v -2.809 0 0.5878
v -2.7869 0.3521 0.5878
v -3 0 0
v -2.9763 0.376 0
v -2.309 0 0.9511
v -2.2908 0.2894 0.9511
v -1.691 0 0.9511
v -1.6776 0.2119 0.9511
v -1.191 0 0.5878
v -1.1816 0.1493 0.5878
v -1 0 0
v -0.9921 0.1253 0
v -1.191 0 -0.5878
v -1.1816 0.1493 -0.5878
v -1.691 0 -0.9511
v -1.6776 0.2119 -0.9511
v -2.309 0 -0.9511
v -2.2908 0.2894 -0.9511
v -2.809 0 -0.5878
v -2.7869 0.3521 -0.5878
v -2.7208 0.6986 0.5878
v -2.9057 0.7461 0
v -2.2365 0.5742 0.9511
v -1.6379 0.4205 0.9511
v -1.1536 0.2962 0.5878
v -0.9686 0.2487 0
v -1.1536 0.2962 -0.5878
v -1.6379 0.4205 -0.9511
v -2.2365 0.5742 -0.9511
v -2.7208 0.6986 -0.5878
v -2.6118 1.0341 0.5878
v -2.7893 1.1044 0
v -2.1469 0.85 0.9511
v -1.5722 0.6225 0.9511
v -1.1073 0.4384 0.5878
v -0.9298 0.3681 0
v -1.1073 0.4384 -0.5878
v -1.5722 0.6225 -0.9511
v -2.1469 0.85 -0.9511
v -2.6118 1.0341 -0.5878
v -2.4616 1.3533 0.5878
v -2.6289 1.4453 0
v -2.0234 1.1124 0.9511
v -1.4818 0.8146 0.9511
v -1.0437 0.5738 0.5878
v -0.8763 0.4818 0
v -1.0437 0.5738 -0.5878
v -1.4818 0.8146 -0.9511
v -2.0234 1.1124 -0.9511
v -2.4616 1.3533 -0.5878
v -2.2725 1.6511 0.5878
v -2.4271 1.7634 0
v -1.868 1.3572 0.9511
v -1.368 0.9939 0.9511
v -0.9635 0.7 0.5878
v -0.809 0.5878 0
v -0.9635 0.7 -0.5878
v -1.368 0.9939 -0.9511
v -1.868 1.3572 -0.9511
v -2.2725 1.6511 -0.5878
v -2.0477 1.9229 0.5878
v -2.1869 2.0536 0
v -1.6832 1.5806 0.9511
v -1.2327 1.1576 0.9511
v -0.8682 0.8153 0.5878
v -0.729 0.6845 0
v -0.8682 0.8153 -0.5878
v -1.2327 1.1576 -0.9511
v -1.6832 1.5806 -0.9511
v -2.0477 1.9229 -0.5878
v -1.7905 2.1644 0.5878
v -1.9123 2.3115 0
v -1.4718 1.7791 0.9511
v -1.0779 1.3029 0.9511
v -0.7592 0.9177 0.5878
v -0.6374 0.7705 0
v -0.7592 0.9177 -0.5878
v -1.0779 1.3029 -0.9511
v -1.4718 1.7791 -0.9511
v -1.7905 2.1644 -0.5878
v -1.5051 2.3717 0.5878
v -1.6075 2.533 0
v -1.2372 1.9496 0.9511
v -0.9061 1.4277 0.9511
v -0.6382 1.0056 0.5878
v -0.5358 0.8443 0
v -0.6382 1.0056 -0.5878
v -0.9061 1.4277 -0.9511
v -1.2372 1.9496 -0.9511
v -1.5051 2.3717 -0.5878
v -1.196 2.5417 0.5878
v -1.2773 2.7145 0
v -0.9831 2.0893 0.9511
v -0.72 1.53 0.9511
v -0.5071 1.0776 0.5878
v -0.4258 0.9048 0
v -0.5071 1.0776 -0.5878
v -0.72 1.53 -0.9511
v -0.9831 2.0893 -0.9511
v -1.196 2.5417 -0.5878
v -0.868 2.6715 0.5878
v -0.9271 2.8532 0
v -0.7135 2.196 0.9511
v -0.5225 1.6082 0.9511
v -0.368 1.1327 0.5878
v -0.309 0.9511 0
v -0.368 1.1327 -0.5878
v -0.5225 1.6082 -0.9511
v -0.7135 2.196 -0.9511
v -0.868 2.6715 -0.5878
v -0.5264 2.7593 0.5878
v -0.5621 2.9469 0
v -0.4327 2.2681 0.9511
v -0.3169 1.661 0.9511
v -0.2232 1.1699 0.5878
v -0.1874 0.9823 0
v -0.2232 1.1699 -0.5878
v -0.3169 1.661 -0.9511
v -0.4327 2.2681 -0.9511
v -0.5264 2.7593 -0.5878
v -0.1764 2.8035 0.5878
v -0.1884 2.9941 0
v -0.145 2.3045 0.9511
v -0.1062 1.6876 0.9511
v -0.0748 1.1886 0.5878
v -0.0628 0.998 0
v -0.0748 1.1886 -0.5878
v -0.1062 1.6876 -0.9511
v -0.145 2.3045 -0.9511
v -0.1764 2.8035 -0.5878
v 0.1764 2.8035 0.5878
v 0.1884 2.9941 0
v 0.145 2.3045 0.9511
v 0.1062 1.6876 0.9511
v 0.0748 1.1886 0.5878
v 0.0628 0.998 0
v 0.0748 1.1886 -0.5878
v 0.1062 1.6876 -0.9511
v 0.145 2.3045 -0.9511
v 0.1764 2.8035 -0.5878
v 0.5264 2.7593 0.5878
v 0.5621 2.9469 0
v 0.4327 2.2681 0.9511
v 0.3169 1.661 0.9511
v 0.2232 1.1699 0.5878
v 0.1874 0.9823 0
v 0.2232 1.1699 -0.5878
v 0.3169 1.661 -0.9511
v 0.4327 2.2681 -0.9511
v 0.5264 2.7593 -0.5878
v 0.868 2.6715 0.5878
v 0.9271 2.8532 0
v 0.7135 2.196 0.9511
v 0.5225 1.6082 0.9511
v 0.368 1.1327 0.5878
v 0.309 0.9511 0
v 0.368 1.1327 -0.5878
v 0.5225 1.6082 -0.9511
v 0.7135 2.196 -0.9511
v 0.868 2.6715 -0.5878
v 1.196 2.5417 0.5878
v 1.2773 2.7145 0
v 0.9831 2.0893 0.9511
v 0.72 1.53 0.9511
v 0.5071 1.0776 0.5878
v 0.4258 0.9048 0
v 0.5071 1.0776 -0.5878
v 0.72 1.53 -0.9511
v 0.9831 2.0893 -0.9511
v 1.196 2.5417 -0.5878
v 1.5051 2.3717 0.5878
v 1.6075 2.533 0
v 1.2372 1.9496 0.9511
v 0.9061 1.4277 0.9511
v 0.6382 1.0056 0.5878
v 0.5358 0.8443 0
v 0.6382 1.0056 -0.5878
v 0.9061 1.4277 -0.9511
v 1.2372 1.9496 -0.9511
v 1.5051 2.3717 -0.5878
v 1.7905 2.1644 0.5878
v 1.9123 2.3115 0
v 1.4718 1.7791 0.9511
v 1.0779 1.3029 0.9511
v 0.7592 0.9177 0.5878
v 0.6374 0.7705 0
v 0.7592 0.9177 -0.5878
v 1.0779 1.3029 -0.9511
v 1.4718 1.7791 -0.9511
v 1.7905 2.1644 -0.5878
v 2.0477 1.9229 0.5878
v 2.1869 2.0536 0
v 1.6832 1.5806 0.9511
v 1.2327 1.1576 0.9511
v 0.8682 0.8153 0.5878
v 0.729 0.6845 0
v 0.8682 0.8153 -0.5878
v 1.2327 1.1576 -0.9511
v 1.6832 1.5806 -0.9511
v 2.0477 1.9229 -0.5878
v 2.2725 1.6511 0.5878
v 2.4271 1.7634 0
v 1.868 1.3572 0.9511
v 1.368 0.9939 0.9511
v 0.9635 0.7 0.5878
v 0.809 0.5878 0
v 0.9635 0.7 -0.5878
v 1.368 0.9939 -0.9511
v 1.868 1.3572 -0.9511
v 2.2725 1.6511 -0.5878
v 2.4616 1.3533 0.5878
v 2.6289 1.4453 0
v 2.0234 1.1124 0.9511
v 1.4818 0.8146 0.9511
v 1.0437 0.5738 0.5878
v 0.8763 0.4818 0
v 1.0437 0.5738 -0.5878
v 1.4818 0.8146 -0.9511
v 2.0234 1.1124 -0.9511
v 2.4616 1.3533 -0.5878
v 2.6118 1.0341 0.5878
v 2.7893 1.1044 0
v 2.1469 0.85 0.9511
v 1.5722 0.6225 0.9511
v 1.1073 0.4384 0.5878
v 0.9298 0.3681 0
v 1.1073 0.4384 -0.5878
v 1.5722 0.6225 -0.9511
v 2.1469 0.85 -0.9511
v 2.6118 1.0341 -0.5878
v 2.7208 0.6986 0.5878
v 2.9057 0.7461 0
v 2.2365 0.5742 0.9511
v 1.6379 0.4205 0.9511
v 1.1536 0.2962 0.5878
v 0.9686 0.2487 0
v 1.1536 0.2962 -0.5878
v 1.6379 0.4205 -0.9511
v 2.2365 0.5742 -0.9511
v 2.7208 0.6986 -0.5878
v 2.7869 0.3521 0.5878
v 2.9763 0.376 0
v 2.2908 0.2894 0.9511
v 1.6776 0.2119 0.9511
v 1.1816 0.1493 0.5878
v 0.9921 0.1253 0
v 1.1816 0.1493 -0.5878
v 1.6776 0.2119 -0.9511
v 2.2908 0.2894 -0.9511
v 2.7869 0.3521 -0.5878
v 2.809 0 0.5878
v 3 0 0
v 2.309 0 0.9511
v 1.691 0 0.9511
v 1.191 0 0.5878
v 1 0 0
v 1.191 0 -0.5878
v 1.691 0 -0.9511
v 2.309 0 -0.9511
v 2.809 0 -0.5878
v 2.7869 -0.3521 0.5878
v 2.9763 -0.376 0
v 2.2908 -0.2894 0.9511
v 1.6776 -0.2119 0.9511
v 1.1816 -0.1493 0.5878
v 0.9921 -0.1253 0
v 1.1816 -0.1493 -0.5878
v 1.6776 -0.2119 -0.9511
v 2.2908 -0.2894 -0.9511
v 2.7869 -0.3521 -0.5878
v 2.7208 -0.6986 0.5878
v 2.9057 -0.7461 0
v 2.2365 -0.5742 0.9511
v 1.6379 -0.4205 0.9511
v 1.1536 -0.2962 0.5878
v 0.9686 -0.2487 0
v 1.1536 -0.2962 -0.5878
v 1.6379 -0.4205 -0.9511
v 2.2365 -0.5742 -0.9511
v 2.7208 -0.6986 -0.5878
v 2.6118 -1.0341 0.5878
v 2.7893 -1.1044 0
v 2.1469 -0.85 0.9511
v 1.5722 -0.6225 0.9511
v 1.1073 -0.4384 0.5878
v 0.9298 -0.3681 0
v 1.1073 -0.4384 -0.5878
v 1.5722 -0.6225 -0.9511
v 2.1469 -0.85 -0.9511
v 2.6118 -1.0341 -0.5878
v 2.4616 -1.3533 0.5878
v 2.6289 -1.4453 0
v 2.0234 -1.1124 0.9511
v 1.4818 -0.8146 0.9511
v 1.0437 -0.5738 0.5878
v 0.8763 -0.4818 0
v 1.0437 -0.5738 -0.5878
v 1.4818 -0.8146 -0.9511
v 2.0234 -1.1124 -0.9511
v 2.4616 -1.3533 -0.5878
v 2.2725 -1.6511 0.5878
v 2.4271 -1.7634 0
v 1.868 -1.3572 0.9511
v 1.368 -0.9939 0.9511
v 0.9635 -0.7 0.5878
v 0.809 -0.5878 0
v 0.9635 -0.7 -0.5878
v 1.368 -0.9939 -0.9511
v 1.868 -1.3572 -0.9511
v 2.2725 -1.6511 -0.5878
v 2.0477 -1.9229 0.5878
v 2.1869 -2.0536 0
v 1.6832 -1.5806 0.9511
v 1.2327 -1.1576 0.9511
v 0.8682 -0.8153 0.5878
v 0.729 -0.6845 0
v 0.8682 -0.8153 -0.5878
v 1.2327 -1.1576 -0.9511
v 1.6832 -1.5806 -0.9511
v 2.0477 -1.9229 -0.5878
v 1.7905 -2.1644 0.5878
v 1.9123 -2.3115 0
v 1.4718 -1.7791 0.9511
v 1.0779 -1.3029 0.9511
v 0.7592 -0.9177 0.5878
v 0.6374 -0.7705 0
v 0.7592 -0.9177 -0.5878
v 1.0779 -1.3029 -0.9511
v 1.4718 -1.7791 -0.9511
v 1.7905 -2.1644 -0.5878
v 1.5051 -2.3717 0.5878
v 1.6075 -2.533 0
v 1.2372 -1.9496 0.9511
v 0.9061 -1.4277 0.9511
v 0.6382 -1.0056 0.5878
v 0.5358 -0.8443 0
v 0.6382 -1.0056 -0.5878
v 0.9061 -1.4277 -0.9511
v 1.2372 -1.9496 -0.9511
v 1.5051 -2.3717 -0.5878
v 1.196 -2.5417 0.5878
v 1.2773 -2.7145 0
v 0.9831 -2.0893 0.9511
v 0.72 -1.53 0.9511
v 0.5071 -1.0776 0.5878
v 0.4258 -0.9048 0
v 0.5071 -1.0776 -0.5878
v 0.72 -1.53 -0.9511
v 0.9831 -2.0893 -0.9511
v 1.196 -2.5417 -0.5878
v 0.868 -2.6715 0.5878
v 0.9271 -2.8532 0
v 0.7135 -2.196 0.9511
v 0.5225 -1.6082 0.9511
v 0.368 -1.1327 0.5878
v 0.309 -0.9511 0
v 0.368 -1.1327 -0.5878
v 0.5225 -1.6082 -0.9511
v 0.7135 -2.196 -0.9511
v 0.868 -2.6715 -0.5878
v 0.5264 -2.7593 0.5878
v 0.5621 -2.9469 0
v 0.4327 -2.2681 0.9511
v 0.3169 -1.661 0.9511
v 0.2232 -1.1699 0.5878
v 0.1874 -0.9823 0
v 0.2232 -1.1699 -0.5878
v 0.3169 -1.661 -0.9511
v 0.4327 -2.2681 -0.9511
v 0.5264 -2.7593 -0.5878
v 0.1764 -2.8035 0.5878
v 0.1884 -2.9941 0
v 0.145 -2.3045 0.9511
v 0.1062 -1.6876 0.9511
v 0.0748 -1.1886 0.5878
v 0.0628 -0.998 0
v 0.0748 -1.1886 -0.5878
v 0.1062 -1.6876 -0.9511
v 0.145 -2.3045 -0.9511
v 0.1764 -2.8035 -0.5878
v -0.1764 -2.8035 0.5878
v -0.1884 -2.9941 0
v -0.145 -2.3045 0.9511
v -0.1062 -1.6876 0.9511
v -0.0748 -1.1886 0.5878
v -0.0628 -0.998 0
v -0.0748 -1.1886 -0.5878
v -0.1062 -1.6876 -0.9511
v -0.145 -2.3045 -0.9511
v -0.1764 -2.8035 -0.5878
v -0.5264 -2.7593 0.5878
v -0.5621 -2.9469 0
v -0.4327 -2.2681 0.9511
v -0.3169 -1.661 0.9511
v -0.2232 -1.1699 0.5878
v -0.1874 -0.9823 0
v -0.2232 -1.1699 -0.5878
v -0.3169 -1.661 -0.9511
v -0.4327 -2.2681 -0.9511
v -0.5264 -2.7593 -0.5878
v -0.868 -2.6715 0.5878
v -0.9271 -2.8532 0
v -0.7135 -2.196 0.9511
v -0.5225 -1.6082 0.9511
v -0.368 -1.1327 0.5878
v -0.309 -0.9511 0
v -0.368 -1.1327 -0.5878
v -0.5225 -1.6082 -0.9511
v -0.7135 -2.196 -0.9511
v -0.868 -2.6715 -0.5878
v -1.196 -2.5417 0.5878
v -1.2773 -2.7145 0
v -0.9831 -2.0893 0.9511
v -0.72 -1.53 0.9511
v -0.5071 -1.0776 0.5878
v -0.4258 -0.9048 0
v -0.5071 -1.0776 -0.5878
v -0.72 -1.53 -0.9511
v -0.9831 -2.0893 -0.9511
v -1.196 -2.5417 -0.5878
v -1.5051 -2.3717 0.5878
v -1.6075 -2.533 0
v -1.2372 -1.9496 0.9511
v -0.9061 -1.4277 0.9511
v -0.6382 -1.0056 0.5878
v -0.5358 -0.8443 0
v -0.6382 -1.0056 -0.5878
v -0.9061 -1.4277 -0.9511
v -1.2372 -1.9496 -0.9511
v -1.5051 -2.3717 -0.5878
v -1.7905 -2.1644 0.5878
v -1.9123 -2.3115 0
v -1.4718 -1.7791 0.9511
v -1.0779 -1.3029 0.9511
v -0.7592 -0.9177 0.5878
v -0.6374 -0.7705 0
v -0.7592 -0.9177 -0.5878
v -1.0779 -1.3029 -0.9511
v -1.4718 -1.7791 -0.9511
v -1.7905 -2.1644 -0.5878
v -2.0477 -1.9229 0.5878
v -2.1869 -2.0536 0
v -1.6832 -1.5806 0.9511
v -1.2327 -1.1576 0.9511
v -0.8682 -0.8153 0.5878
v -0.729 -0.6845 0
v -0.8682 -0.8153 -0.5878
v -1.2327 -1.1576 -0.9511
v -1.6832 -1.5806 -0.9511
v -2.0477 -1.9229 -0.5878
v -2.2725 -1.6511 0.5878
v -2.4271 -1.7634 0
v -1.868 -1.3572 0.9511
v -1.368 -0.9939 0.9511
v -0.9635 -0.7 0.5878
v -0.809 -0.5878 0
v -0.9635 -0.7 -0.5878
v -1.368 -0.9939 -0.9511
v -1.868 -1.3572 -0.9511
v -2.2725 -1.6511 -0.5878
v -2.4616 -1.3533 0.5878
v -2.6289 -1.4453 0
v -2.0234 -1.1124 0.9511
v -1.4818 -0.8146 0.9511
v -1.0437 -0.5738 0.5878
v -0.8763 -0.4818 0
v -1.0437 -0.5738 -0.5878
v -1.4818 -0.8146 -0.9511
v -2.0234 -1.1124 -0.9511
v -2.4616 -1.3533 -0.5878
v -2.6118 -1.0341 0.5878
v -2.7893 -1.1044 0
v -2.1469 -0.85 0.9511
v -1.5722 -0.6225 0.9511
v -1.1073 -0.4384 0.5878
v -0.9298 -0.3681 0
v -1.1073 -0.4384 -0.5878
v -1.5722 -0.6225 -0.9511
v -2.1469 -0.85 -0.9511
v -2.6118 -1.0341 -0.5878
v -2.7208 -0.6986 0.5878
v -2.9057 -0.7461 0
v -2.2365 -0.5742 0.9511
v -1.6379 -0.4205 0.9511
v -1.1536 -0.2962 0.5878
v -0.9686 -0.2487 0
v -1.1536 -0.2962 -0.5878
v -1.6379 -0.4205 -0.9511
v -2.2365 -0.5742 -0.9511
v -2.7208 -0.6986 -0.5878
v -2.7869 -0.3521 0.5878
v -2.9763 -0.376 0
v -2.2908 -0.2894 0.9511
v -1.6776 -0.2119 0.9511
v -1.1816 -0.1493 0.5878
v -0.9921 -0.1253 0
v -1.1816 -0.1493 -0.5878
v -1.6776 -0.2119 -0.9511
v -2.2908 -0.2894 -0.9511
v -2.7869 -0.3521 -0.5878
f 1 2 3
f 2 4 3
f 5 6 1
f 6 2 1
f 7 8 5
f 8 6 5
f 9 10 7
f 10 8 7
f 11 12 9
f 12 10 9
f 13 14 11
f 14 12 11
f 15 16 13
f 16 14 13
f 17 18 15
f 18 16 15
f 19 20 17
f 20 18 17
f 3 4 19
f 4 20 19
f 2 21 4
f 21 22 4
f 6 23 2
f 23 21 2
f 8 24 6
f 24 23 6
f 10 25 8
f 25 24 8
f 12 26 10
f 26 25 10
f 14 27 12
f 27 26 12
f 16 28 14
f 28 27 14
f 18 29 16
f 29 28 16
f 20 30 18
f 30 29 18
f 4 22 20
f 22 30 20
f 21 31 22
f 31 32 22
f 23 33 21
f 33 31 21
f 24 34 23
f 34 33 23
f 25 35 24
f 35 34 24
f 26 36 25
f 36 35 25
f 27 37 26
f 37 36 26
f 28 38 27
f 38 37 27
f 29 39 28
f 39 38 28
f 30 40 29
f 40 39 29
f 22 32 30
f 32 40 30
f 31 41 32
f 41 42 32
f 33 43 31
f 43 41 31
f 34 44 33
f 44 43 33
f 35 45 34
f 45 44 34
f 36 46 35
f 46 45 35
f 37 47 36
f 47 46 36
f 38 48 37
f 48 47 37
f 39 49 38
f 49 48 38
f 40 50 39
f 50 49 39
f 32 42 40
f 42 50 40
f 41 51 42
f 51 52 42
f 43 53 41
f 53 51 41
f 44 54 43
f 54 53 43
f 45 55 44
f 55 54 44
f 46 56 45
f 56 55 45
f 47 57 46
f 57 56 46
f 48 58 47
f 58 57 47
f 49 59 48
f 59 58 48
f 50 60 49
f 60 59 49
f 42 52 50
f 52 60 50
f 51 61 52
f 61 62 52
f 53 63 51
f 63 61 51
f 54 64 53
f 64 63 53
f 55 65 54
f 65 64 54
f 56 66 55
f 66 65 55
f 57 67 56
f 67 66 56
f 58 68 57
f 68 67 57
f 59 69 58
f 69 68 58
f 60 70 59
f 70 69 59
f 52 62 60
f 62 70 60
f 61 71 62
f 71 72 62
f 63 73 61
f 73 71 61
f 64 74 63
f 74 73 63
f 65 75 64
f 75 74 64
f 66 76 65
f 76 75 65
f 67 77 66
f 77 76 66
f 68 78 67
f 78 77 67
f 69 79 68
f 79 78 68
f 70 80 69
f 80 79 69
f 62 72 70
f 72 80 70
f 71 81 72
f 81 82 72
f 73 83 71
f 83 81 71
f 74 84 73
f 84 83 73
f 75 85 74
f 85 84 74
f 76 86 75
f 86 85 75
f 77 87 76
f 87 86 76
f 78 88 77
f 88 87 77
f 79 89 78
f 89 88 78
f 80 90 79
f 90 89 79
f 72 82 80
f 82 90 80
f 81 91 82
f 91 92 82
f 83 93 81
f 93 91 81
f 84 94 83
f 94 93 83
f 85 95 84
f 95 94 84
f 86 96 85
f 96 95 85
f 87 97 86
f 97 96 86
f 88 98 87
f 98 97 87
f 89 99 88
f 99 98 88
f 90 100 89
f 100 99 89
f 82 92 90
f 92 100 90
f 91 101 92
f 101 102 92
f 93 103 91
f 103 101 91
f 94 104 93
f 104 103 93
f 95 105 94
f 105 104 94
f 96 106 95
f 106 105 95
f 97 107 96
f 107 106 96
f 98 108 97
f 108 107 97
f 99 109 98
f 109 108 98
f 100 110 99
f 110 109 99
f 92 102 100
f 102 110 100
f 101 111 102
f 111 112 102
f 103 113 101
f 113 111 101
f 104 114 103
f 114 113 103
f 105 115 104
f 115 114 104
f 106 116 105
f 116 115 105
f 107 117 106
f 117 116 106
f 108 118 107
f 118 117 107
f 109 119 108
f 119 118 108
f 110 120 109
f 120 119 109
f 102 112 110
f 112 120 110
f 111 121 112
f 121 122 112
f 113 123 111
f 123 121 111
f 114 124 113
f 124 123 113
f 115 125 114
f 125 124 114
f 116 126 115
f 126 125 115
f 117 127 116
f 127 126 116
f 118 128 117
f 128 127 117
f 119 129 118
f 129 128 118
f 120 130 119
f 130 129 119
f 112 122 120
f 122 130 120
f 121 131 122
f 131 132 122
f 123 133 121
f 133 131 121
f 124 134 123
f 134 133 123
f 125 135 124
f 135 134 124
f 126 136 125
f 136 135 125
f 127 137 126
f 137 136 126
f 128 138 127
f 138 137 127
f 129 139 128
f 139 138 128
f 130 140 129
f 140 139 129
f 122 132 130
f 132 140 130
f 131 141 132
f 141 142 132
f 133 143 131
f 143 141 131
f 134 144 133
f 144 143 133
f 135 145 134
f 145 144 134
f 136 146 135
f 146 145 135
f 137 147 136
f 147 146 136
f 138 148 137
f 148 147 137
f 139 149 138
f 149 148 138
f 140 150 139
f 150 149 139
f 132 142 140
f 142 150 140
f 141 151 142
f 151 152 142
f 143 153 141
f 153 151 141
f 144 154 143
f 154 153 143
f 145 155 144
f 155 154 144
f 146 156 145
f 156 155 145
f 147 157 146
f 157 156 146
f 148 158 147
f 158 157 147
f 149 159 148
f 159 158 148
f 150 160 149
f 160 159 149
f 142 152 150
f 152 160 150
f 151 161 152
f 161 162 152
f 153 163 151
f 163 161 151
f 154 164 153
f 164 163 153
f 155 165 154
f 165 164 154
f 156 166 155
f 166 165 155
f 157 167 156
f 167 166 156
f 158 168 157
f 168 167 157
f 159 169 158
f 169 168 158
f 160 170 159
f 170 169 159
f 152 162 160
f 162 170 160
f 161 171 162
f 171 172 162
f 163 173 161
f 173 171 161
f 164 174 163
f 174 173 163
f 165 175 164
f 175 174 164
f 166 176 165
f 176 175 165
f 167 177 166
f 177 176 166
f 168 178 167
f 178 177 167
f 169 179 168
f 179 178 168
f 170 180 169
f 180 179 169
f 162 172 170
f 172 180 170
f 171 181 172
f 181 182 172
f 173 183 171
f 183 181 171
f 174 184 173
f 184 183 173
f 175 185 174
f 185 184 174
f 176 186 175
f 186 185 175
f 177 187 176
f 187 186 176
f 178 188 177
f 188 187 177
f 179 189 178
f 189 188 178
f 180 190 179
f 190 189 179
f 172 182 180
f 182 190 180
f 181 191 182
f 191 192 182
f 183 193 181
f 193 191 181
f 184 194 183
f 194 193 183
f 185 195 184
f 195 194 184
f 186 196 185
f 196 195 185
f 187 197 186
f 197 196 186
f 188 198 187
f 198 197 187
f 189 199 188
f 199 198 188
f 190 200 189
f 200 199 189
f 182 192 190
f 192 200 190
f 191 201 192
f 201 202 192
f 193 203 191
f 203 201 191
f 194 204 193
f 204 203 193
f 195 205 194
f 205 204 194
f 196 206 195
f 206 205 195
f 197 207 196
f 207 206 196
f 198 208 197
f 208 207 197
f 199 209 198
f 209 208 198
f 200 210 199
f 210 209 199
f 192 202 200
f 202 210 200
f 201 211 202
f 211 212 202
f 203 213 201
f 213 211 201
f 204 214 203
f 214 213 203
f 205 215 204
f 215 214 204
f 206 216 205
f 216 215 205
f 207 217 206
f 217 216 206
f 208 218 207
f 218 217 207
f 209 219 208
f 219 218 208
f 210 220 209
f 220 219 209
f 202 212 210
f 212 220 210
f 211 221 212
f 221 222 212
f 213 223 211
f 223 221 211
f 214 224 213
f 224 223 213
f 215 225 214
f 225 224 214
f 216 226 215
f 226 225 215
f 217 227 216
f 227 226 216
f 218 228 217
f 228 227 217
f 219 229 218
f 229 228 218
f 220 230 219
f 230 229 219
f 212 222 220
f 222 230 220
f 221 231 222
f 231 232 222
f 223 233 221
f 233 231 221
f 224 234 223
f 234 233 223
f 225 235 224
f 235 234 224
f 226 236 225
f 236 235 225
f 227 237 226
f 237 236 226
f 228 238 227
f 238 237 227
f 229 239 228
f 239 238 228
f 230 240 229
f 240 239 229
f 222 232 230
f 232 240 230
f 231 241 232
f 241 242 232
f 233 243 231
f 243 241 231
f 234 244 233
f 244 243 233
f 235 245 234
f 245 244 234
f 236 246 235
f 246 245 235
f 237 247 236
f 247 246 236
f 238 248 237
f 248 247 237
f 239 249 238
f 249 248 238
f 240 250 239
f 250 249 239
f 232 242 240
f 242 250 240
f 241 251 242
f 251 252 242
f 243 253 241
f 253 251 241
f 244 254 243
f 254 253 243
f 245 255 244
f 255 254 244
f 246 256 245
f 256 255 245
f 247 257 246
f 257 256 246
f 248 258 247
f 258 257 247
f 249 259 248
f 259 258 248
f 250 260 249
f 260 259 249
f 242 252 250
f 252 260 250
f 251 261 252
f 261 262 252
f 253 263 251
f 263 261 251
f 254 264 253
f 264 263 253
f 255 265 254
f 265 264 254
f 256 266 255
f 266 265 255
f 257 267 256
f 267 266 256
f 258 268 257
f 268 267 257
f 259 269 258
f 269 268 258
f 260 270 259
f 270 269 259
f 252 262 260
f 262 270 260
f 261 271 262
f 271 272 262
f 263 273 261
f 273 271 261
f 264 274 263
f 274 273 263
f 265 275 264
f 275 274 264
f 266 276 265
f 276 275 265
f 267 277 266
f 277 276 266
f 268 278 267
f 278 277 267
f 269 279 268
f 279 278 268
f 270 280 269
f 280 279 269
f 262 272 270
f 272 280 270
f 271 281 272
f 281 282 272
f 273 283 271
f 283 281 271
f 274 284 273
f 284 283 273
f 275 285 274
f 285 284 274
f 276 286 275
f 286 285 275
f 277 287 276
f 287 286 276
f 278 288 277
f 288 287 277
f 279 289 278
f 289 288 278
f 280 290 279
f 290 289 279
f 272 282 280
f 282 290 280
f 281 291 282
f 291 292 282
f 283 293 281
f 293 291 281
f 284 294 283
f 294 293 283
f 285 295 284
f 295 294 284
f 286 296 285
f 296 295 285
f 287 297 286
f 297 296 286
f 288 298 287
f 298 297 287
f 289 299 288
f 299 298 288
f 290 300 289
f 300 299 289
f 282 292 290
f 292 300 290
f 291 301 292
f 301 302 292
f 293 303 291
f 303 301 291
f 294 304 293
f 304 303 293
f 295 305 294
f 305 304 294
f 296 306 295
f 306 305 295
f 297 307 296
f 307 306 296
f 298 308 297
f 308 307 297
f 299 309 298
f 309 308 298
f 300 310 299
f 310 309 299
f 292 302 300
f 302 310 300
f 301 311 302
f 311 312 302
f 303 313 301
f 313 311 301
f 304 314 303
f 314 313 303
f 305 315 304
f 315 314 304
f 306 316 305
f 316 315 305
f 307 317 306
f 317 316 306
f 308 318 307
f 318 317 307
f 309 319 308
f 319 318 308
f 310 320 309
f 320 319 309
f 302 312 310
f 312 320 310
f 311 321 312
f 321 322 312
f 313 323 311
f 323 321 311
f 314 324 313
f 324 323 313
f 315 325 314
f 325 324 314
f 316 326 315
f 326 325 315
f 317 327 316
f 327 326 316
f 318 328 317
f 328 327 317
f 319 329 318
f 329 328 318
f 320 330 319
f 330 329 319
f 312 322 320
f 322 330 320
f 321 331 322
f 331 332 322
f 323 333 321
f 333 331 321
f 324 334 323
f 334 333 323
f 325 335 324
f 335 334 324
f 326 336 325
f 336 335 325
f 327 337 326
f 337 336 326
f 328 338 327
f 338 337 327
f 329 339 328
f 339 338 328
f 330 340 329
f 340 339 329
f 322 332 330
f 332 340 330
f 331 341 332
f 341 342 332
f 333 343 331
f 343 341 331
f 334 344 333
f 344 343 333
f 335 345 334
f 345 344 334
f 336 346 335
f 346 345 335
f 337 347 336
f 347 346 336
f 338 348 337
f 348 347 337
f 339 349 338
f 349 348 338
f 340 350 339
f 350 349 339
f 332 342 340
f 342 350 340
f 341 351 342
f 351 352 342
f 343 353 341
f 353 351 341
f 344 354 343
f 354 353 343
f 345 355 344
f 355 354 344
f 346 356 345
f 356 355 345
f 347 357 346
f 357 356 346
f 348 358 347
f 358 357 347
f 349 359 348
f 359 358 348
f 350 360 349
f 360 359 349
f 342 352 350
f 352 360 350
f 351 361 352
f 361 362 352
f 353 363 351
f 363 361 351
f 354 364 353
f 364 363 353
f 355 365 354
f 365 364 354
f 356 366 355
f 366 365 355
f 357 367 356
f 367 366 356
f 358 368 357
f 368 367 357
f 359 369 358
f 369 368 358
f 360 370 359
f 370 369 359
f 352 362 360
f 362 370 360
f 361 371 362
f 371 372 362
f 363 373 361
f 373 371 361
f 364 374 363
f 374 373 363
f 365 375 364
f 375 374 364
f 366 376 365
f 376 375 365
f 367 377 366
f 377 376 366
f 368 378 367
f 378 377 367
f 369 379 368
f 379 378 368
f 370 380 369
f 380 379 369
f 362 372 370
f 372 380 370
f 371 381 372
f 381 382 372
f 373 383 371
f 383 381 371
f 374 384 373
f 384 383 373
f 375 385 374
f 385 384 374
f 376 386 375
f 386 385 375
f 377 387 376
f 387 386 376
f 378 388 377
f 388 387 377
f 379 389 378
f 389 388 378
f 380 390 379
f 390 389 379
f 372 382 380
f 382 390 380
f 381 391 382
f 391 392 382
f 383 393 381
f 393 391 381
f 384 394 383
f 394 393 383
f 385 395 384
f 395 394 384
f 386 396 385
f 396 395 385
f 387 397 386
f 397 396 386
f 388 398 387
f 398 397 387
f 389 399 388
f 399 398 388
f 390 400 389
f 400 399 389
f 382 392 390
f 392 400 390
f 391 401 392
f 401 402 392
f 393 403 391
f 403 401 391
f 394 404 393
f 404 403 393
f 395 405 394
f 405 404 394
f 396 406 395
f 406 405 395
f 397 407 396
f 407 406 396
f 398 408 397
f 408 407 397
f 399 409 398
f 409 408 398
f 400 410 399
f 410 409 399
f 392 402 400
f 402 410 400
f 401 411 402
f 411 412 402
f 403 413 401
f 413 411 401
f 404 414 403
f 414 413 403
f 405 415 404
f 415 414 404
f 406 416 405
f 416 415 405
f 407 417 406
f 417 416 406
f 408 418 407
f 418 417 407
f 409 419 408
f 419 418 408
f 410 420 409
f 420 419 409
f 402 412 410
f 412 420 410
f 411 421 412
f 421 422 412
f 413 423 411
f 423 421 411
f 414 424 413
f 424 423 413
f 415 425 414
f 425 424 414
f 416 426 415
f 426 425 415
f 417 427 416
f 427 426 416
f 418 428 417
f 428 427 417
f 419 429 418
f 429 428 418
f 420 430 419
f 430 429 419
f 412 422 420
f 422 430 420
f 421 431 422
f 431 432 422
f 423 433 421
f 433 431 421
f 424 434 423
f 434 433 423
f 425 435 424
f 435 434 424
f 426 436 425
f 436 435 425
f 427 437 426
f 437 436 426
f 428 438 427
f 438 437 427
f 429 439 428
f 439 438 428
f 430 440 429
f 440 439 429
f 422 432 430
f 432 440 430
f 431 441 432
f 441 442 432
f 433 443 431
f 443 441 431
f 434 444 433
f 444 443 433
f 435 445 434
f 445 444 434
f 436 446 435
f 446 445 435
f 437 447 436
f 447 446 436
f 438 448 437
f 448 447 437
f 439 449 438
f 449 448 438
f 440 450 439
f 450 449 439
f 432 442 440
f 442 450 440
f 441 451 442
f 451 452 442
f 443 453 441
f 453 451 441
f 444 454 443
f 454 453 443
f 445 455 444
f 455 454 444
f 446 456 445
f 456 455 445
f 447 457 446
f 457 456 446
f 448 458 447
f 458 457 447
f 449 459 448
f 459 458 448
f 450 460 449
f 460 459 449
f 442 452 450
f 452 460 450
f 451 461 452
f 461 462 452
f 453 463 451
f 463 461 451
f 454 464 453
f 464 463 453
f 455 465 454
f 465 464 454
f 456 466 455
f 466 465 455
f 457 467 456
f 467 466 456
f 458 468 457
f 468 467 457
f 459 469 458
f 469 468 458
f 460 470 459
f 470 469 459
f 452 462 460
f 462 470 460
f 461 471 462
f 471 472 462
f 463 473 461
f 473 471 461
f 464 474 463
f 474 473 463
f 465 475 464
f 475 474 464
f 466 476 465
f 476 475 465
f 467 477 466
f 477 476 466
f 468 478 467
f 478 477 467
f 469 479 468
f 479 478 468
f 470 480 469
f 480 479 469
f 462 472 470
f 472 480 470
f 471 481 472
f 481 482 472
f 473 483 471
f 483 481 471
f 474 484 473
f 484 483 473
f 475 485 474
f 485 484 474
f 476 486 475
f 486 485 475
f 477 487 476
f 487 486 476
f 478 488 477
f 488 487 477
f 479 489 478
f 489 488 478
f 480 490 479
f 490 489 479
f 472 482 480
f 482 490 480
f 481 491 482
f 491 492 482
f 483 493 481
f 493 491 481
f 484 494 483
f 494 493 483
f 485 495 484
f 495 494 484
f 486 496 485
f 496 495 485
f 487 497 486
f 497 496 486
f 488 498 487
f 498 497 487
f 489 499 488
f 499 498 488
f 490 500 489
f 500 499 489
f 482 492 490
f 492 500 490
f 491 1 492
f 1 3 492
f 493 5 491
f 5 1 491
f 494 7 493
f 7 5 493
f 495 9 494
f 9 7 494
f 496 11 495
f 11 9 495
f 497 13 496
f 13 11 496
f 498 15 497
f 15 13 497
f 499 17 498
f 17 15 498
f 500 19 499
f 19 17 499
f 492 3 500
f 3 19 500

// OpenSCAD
rotate_extrude(convexity = 10, $fn = 50)
translate([2, 0, 0])
circle(r = 1, $fn = 10);
